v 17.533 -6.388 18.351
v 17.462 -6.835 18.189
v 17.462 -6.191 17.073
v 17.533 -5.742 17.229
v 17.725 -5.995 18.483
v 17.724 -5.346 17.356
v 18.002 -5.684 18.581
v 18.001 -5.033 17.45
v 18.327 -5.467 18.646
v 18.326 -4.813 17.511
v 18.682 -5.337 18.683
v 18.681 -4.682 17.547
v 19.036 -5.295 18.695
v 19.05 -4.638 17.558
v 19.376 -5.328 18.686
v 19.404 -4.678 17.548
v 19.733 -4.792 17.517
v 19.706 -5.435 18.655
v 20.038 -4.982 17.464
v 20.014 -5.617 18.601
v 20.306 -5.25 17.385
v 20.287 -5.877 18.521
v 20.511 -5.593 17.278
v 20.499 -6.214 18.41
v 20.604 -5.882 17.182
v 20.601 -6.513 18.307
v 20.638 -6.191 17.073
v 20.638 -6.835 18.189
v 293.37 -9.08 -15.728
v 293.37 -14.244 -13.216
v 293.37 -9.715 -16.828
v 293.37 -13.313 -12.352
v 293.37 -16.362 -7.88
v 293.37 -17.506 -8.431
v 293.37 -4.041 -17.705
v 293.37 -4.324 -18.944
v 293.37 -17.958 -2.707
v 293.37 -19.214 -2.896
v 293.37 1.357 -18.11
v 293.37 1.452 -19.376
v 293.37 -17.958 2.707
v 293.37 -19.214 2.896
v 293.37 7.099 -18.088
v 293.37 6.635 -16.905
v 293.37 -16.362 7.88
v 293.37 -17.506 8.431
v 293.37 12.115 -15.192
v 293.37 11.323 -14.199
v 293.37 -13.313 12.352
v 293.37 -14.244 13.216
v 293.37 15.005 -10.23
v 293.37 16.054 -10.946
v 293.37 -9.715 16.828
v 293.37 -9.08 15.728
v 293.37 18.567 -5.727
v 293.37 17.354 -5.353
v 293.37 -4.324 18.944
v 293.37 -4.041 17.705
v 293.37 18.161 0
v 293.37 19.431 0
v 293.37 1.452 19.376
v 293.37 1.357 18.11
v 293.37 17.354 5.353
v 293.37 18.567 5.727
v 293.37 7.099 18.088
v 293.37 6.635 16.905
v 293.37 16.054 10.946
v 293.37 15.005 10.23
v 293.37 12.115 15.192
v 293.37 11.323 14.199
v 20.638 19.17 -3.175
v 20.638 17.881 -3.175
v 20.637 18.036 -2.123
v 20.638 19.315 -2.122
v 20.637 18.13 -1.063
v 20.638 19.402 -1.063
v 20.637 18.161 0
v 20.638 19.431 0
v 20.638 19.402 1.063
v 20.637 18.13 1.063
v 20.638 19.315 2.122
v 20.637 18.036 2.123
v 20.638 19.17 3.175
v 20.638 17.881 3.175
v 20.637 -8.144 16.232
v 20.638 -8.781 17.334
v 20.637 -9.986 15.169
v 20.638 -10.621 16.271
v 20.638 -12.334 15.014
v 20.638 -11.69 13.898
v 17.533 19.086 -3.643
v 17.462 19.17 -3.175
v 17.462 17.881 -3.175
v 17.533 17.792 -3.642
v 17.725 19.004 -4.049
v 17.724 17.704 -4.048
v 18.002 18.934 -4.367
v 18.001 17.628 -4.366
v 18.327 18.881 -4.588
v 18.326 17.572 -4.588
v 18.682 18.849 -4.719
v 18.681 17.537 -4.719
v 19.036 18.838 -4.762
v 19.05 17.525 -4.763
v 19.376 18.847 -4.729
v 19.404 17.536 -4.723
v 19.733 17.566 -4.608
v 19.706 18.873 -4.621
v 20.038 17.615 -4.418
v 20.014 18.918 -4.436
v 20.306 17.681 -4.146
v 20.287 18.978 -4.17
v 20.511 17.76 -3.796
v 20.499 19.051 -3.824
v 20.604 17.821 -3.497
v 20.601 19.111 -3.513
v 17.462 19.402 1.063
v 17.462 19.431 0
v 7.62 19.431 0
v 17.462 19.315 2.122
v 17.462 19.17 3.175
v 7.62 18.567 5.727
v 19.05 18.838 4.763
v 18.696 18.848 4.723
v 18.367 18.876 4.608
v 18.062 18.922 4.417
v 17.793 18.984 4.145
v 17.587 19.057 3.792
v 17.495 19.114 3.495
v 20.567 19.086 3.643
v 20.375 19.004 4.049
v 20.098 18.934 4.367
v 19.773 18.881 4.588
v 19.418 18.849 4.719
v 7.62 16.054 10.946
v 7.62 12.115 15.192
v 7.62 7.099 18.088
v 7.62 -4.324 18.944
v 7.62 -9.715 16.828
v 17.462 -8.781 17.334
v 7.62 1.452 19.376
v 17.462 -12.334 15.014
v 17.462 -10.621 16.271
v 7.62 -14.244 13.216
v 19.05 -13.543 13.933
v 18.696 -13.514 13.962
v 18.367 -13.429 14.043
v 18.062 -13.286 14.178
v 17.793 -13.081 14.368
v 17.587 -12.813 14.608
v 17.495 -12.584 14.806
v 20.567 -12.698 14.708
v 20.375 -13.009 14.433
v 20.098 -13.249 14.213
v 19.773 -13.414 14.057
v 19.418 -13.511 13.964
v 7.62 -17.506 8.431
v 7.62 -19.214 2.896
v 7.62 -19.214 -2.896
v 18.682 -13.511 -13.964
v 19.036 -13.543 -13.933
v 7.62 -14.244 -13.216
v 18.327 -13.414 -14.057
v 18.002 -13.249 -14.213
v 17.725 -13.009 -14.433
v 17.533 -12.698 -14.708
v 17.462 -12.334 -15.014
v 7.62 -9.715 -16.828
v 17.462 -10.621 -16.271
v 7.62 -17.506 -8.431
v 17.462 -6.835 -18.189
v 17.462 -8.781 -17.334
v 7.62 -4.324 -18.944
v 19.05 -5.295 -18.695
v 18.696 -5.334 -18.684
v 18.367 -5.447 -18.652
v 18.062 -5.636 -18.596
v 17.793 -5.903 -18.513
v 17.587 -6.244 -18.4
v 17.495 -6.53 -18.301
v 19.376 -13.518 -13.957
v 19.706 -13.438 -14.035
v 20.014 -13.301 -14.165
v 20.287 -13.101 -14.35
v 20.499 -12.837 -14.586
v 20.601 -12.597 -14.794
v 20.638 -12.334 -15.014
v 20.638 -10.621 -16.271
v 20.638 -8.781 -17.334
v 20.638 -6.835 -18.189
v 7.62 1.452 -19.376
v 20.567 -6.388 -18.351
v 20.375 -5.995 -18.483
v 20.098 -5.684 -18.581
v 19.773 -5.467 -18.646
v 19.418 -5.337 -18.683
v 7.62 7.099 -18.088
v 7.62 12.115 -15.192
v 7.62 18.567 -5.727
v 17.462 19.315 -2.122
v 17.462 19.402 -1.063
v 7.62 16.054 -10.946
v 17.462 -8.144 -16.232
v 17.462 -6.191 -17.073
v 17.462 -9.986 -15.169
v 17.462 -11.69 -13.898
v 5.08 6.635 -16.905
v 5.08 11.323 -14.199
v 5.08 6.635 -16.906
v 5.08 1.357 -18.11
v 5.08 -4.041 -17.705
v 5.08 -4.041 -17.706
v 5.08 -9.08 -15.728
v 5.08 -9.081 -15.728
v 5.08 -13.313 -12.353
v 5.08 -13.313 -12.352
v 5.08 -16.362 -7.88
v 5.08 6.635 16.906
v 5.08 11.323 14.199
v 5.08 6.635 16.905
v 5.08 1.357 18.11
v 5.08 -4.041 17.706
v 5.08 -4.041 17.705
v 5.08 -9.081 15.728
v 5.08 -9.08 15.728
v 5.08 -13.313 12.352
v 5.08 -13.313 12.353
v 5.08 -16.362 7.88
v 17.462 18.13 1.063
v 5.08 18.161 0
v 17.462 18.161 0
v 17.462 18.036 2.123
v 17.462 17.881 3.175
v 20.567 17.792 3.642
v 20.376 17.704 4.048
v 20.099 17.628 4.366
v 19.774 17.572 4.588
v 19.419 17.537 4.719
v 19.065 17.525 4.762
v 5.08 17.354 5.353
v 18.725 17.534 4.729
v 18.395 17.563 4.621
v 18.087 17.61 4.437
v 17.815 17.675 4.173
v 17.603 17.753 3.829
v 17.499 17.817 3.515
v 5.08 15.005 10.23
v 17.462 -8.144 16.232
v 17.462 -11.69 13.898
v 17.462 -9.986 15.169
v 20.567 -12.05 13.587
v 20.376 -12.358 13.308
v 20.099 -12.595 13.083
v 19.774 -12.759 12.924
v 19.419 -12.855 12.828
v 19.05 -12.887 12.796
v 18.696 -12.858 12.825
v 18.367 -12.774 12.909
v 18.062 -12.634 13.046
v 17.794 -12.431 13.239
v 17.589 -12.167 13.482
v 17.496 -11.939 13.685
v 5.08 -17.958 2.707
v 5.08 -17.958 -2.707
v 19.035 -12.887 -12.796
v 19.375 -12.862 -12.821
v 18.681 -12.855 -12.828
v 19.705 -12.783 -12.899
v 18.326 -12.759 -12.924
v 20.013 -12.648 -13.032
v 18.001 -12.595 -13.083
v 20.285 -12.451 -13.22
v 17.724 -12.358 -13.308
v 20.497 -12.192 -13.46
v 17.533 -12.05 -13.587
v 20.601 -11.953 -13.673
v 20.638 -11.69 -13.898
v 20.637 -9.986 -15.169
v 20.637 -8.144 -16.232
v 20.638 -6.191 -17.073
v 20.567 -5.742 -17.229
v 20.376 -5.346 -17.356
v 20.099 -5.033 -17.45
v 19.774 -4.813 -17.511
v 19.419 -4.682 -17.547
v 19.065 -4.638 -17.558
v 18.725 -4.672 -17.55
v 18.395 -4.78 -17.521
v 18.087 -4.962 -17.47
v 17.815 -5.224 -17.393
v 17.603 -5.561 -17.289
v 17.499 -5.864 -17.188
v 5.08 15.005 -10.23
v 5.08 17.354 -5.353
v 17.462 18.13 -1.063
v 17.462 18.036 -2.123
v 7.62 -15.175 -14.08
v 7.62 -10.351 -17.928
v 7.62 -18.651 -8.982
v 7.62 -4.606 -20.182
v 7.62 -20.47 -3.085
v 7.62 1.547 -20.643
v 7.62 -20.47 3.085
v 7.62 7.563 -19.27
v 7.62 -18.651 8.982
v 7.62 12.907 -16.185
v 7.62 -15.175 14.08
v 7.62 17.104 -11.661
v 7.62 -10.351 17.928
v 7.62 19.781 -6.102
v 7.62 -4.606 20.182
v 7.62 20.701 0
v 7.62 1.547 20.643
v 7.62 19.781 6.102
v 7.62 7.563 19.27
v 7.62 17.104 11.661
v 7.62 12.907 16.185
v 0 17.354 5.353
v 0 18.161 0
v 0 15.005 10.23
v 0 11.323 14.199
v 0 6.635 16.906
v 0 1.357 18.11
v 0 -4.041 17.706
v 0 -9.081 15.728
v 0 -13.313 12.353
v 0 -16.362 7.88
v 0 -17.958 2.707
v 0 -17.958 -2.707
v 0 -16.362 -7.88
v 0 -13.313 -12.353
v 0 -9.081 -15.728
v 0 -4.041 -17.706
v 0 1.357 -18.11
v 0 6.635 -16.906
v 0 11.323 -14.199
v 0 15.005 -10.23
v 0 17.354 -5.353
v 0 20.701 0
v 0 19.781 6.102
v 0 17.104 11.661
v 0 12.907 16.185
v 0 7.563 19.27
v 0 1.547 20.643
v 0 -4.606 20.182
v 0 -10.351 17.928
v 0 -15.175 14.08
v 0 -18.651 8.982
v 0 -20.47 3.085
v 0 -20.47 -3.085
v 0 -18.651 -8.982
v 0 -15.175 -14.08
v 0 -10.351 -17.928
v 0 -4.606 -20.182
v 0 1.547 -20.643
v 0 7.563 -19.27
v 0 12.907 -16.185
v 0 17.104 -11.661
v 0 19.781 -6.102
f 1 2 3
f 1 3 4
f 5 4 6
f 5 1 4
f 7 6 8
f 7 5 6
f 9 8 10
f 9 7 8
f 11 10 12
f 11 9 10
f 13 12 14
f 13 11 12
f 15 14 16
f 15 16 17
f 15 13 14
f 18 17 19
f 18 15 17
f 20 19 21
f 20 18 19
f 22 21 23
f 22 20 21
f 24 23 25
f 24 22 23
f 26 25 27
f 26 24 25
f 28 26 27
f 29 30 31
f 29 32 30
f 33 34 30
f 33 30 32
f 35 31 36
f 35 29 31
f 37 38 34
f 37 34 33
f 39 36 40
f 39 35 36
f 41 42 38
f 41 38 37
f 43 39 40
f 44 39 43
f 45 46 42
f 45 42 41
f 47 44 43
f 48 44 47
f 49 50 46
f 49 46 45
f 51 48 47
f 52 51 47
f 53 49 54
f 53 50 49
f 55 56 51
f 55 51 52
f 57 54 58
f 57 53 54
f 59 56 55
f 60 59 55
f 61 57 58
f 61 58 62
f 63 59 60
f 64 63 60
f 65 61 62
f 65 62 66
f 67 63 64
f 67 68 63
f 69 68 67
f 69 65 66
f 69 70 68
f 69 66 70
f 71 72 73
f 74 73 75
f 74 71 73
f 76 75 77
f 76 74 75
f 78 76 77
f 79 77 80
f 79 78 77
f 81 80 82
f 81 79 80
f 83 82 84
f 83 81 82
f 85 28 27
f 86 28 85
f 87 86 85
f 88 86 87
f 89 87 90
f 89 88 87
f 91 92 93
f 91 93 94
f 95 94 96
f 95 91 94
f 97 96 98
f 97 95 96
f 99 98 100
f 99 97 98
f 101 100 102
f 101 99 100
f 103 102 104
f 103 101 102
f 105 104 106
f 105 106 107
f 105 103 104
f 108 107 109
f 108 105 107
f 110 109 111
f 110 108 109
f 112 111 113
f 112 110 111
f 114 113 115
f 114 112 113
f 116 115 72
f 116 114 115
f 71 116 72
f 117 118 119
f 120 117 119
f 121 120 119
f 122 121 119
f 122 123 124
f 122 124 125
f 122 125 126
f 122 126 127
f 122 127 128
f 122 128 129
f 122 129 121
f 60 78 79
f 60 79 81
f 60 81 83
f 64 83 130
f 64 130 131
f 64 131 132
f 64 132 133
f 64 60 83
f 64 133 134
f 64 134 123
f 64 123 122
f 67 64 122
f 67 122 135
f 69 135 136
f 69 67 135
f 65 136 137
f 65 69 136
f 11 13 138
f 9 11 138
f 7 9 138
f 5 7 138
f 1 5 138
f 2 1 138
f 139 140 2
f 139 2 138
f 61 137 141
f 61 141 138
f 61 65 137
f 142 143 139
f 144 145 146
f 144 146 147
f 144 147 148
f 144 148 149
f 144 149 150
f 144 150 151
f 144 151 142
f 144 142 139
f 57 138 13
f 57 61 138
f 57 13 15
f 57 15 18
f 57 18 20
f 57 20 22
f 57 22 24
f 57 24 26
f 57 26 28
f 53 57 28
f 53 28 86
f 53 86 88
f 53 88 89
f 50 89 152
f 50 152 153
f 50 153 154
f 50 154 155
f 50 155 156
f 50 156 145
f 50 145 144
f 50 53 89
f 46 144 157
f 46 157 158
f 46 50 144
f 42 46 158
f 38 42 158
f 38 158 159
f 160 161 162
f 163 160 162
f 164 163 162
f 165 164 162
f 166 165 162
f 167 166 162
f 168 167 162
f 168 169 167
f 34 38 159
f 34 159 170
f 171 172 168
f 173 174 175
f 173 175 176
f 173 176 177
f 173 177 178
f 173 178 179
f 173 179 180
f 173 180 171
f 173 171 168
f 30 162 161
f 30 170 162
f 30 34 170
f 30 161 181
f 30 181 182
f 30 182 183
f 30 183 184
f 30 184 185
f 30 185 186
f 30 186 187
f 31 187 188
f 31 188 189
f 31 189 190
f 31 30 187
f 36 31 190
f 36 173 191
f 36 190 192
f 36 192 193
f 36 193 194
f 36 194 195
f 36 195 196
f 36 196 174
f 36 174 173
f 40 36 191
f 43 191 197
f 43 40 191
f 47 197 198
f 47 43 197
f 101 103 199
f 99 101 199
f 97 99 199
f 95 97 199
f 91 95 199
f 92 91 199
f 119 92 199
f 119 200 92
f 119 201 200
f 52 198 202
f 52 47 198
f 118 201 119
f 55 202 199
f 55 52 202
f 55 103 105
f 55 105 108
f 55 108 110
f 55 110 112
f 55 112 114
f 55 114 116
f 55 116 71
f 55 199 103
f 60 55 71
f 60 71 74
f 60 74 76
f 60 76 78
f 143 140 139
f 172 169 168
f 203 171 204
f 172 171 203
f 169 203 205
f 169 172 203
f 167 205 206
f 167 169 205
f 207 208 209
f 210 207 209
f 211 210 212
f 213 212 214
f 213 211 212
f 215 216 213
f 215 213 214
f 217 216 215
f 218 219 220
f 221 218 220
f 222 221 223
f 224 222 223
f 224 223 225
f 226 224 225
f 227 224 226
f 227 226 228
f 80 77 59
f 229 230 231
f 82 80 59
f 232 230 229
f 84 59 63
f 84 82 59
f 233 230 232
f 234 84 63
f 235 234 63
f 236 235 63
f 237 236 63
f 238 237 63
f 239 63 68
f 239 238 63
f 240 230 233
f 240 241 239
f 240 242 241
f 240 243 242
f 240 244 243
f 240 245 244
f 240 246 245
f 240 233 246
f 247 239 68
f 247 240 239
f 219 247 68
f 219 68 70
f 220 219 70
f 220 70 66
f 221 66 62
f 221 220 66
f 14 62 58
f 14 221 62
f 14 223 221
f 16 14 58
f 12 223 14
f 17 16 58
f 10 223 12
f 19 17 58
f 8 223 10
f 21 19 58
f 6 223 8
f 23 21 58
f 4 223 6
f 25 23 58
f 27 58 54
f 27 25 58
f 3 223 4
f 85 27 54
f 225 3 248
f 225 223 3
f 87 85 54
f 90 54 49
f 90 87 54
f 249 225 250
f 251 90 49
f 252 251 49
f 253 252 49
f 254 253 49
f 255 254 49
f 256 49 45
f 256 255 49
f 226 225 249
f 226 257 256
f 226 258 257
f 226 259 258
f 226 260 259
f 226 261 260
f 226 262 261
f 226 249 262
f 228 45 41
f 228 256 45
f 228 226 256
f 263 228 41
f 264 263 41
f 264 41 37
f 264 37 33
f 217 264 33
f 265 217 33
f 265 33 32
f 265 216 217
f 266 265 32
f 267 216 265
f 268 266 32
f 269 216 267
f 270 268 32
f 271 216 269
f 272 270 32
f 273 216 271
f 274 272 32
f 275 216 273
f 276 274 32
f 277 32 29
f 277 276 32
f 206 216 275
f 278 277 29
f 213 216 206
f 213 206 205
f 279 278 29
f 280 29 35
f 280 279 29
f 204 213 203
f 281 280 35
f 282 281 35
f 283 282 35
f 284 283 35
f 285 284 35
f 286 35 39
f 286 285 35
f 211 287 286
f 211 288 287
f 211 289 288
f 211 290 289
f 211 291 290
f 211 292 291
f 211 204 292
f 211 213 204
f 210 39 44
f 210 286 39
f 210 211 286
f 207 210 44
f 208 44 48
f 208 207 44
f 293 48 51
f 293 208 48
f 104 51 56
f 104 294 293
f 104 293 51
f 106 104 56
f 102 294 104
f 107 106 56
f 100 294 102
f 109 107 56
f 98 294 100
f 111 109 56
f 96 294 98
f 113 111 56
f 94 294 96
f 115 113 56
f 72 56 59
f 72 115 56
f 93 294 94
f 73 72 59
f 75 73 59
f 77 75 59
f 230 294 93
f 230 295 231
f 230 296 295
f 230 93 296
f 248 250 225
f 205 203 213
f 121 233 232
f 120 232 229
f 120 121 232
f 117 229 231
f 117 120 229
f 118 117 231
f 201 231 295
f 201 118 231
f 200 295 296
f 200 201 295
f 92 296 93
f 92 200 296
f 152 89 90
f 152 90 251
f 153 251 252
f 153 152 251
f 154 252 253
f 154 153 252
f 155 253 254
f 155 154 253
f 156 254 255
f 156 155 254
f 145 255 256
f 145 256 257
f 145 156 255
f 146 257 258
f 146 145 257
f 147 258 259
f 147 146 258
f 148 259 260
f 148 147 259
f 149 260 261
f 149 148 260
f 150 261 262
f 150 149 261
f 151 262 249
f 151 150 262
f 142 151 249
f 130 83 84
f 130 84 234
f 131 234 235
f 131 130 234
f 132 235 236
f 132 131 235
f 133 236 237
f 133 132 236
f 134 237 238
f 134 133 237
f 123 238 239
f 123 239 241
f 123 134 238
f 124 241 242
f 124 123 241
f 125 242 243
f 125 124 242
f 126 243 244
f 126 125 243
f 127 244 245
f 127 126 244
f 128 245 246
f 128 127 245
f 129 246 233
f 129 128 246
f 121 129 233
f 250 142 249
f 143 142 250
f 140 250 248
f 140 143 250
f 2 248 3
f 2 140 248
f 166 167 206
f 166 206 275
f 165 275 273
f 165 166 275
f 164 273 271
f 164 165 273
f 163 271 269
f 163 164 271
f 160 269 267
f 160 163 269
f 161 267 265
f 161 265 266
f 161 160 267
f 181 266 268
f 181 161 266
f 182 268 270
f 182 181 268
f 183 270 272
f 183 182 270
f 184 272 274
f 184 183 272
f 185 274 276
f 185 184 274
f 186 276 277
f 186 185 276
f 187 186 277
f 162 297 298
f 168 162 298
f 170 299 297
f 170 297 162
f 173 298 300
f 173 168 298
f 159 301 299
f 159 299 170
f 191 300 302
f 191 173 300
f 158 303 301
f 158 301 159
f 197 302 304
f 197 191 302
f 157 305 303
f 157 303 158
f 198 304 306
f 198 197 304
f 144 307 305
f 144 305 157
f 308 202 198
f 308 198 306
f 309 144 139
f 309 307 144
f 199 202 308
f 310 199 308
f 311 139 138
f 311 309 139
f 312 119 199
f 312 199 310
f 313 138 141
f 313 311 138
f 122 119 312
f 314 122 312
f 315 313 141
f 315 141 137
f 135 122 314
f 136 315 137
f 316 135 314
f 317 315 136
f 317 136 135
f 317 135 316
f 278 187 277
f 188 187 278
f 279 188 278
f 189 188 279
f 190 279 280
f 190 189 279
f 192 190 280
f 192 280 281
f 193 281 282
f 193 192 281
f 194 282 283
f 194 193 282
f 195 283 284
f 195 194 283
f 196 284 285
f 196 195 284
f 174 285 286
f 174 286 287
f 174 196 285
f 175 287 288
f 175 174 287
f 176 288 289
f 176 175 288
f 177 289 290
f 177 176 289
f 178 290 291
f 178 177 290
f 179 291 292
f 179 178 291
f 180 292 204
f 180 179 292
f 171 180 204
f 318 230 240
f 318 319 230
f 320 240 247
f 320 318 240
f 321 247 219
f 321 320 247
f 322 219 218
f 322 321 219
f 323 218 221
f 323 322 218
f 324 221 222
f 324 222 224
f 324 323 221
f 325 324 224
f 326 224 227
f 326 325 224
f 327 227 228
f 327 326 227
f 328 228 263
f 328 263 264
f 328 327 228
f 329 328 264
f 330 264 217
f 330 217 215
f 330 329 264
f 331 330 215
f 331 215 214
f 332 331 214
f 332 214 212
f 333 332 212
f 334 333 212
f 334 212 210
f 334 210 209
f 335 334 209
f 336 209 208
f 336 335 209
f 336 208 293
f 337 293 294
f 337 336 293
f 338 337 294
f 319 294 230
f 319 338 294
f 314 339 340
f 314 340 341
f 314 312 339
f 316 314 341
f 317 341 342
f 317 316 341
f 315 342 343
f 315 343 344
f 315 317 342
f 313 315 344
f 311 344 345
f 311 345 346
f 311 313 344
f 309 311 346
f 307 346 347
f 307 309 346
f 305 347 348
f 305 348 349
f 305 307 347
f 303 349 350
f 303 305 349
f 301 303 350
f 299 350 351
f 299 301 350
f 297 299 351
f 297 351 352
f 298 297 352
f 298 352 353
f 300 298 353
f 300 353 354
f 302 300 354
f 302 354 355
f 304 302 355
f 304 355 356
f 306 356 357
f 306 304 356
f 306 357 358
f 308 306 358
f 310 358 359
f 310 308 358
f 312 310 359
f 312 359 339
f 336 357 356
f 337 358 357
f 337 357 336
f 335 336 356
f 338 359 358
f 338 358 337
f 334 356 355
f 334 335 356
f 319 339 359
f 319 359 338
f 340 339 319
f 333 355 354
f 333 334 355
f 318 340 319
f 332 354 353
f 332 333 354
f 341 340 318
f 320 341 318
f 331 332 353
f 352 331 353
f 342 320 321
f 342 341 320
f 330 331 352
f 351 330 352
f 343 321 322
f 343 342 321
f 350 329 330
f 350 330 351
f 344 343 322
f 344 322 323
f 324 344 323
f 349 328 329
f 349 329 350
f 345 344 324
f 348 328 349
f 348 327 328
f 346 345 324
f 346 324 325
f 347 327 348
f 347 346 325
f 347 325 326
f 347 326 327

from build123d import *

# Parameters (mm, degrees)
CUT_EXTRUDE1_DEPTH = 5.08
CIRPATTERN1_COUNT  = 3


# Read off the part's stored shape, not the designer's step: Revolve1
with BuildPart() as part:
    # Revolve1 outline → Revolve1 (revolve)
    with BuildSketch(Plane.YX):
        Polygon((20.701, 7.62), (19.430746, 7.62), (19.430746, 293.37), (18.160746, 293.37), (18.160746, 5.08), (18.161, 5.08), (18.161, 0), (20.701, 0), align=None)
    revolve(axis=Axis((0, 0, 0), (1, 0, 0)))

    # Sketch2 → Cut-Extrude1 (cut)
    with BuildSketch(Plane(origin=(0, 19.430746, 0), x_dir=(1, 0, 0), z_dir=(0, 1, 0))):
        with BuildLine():
            Line((20.6375, 3.175), (20.6375, -3.175))
            ThreePointArc((20.6375, -3.175), (19.05, -4.7625), (17.4625, -3.175))
            Line((17.4625, -3.175), (17.4625, 3.175))
            ThreePointArc((17.4625, 3.175), (19.05, 4.7625), (20.6375, 3.175))
        make_face()
    cut_extrude1 = extrude(amount=-CUT_EXTRUDE1_DEPTH, mode=Mode.SUBTRACT)

    # CirPattern1: Cut-Extrude1 ×3 about axis
    cirpattern1_axis = Axis((0, 0, 0), (-1, 0, 0))
    for i in range(1, CIRPATTERN1_COUNT):
        add(cut_extrude1.rotate(cirpattern1_axis, i * 360 / CIRPATTERN1_COUNT), mode=Mode.SUBTRACT)


solid = part.part
